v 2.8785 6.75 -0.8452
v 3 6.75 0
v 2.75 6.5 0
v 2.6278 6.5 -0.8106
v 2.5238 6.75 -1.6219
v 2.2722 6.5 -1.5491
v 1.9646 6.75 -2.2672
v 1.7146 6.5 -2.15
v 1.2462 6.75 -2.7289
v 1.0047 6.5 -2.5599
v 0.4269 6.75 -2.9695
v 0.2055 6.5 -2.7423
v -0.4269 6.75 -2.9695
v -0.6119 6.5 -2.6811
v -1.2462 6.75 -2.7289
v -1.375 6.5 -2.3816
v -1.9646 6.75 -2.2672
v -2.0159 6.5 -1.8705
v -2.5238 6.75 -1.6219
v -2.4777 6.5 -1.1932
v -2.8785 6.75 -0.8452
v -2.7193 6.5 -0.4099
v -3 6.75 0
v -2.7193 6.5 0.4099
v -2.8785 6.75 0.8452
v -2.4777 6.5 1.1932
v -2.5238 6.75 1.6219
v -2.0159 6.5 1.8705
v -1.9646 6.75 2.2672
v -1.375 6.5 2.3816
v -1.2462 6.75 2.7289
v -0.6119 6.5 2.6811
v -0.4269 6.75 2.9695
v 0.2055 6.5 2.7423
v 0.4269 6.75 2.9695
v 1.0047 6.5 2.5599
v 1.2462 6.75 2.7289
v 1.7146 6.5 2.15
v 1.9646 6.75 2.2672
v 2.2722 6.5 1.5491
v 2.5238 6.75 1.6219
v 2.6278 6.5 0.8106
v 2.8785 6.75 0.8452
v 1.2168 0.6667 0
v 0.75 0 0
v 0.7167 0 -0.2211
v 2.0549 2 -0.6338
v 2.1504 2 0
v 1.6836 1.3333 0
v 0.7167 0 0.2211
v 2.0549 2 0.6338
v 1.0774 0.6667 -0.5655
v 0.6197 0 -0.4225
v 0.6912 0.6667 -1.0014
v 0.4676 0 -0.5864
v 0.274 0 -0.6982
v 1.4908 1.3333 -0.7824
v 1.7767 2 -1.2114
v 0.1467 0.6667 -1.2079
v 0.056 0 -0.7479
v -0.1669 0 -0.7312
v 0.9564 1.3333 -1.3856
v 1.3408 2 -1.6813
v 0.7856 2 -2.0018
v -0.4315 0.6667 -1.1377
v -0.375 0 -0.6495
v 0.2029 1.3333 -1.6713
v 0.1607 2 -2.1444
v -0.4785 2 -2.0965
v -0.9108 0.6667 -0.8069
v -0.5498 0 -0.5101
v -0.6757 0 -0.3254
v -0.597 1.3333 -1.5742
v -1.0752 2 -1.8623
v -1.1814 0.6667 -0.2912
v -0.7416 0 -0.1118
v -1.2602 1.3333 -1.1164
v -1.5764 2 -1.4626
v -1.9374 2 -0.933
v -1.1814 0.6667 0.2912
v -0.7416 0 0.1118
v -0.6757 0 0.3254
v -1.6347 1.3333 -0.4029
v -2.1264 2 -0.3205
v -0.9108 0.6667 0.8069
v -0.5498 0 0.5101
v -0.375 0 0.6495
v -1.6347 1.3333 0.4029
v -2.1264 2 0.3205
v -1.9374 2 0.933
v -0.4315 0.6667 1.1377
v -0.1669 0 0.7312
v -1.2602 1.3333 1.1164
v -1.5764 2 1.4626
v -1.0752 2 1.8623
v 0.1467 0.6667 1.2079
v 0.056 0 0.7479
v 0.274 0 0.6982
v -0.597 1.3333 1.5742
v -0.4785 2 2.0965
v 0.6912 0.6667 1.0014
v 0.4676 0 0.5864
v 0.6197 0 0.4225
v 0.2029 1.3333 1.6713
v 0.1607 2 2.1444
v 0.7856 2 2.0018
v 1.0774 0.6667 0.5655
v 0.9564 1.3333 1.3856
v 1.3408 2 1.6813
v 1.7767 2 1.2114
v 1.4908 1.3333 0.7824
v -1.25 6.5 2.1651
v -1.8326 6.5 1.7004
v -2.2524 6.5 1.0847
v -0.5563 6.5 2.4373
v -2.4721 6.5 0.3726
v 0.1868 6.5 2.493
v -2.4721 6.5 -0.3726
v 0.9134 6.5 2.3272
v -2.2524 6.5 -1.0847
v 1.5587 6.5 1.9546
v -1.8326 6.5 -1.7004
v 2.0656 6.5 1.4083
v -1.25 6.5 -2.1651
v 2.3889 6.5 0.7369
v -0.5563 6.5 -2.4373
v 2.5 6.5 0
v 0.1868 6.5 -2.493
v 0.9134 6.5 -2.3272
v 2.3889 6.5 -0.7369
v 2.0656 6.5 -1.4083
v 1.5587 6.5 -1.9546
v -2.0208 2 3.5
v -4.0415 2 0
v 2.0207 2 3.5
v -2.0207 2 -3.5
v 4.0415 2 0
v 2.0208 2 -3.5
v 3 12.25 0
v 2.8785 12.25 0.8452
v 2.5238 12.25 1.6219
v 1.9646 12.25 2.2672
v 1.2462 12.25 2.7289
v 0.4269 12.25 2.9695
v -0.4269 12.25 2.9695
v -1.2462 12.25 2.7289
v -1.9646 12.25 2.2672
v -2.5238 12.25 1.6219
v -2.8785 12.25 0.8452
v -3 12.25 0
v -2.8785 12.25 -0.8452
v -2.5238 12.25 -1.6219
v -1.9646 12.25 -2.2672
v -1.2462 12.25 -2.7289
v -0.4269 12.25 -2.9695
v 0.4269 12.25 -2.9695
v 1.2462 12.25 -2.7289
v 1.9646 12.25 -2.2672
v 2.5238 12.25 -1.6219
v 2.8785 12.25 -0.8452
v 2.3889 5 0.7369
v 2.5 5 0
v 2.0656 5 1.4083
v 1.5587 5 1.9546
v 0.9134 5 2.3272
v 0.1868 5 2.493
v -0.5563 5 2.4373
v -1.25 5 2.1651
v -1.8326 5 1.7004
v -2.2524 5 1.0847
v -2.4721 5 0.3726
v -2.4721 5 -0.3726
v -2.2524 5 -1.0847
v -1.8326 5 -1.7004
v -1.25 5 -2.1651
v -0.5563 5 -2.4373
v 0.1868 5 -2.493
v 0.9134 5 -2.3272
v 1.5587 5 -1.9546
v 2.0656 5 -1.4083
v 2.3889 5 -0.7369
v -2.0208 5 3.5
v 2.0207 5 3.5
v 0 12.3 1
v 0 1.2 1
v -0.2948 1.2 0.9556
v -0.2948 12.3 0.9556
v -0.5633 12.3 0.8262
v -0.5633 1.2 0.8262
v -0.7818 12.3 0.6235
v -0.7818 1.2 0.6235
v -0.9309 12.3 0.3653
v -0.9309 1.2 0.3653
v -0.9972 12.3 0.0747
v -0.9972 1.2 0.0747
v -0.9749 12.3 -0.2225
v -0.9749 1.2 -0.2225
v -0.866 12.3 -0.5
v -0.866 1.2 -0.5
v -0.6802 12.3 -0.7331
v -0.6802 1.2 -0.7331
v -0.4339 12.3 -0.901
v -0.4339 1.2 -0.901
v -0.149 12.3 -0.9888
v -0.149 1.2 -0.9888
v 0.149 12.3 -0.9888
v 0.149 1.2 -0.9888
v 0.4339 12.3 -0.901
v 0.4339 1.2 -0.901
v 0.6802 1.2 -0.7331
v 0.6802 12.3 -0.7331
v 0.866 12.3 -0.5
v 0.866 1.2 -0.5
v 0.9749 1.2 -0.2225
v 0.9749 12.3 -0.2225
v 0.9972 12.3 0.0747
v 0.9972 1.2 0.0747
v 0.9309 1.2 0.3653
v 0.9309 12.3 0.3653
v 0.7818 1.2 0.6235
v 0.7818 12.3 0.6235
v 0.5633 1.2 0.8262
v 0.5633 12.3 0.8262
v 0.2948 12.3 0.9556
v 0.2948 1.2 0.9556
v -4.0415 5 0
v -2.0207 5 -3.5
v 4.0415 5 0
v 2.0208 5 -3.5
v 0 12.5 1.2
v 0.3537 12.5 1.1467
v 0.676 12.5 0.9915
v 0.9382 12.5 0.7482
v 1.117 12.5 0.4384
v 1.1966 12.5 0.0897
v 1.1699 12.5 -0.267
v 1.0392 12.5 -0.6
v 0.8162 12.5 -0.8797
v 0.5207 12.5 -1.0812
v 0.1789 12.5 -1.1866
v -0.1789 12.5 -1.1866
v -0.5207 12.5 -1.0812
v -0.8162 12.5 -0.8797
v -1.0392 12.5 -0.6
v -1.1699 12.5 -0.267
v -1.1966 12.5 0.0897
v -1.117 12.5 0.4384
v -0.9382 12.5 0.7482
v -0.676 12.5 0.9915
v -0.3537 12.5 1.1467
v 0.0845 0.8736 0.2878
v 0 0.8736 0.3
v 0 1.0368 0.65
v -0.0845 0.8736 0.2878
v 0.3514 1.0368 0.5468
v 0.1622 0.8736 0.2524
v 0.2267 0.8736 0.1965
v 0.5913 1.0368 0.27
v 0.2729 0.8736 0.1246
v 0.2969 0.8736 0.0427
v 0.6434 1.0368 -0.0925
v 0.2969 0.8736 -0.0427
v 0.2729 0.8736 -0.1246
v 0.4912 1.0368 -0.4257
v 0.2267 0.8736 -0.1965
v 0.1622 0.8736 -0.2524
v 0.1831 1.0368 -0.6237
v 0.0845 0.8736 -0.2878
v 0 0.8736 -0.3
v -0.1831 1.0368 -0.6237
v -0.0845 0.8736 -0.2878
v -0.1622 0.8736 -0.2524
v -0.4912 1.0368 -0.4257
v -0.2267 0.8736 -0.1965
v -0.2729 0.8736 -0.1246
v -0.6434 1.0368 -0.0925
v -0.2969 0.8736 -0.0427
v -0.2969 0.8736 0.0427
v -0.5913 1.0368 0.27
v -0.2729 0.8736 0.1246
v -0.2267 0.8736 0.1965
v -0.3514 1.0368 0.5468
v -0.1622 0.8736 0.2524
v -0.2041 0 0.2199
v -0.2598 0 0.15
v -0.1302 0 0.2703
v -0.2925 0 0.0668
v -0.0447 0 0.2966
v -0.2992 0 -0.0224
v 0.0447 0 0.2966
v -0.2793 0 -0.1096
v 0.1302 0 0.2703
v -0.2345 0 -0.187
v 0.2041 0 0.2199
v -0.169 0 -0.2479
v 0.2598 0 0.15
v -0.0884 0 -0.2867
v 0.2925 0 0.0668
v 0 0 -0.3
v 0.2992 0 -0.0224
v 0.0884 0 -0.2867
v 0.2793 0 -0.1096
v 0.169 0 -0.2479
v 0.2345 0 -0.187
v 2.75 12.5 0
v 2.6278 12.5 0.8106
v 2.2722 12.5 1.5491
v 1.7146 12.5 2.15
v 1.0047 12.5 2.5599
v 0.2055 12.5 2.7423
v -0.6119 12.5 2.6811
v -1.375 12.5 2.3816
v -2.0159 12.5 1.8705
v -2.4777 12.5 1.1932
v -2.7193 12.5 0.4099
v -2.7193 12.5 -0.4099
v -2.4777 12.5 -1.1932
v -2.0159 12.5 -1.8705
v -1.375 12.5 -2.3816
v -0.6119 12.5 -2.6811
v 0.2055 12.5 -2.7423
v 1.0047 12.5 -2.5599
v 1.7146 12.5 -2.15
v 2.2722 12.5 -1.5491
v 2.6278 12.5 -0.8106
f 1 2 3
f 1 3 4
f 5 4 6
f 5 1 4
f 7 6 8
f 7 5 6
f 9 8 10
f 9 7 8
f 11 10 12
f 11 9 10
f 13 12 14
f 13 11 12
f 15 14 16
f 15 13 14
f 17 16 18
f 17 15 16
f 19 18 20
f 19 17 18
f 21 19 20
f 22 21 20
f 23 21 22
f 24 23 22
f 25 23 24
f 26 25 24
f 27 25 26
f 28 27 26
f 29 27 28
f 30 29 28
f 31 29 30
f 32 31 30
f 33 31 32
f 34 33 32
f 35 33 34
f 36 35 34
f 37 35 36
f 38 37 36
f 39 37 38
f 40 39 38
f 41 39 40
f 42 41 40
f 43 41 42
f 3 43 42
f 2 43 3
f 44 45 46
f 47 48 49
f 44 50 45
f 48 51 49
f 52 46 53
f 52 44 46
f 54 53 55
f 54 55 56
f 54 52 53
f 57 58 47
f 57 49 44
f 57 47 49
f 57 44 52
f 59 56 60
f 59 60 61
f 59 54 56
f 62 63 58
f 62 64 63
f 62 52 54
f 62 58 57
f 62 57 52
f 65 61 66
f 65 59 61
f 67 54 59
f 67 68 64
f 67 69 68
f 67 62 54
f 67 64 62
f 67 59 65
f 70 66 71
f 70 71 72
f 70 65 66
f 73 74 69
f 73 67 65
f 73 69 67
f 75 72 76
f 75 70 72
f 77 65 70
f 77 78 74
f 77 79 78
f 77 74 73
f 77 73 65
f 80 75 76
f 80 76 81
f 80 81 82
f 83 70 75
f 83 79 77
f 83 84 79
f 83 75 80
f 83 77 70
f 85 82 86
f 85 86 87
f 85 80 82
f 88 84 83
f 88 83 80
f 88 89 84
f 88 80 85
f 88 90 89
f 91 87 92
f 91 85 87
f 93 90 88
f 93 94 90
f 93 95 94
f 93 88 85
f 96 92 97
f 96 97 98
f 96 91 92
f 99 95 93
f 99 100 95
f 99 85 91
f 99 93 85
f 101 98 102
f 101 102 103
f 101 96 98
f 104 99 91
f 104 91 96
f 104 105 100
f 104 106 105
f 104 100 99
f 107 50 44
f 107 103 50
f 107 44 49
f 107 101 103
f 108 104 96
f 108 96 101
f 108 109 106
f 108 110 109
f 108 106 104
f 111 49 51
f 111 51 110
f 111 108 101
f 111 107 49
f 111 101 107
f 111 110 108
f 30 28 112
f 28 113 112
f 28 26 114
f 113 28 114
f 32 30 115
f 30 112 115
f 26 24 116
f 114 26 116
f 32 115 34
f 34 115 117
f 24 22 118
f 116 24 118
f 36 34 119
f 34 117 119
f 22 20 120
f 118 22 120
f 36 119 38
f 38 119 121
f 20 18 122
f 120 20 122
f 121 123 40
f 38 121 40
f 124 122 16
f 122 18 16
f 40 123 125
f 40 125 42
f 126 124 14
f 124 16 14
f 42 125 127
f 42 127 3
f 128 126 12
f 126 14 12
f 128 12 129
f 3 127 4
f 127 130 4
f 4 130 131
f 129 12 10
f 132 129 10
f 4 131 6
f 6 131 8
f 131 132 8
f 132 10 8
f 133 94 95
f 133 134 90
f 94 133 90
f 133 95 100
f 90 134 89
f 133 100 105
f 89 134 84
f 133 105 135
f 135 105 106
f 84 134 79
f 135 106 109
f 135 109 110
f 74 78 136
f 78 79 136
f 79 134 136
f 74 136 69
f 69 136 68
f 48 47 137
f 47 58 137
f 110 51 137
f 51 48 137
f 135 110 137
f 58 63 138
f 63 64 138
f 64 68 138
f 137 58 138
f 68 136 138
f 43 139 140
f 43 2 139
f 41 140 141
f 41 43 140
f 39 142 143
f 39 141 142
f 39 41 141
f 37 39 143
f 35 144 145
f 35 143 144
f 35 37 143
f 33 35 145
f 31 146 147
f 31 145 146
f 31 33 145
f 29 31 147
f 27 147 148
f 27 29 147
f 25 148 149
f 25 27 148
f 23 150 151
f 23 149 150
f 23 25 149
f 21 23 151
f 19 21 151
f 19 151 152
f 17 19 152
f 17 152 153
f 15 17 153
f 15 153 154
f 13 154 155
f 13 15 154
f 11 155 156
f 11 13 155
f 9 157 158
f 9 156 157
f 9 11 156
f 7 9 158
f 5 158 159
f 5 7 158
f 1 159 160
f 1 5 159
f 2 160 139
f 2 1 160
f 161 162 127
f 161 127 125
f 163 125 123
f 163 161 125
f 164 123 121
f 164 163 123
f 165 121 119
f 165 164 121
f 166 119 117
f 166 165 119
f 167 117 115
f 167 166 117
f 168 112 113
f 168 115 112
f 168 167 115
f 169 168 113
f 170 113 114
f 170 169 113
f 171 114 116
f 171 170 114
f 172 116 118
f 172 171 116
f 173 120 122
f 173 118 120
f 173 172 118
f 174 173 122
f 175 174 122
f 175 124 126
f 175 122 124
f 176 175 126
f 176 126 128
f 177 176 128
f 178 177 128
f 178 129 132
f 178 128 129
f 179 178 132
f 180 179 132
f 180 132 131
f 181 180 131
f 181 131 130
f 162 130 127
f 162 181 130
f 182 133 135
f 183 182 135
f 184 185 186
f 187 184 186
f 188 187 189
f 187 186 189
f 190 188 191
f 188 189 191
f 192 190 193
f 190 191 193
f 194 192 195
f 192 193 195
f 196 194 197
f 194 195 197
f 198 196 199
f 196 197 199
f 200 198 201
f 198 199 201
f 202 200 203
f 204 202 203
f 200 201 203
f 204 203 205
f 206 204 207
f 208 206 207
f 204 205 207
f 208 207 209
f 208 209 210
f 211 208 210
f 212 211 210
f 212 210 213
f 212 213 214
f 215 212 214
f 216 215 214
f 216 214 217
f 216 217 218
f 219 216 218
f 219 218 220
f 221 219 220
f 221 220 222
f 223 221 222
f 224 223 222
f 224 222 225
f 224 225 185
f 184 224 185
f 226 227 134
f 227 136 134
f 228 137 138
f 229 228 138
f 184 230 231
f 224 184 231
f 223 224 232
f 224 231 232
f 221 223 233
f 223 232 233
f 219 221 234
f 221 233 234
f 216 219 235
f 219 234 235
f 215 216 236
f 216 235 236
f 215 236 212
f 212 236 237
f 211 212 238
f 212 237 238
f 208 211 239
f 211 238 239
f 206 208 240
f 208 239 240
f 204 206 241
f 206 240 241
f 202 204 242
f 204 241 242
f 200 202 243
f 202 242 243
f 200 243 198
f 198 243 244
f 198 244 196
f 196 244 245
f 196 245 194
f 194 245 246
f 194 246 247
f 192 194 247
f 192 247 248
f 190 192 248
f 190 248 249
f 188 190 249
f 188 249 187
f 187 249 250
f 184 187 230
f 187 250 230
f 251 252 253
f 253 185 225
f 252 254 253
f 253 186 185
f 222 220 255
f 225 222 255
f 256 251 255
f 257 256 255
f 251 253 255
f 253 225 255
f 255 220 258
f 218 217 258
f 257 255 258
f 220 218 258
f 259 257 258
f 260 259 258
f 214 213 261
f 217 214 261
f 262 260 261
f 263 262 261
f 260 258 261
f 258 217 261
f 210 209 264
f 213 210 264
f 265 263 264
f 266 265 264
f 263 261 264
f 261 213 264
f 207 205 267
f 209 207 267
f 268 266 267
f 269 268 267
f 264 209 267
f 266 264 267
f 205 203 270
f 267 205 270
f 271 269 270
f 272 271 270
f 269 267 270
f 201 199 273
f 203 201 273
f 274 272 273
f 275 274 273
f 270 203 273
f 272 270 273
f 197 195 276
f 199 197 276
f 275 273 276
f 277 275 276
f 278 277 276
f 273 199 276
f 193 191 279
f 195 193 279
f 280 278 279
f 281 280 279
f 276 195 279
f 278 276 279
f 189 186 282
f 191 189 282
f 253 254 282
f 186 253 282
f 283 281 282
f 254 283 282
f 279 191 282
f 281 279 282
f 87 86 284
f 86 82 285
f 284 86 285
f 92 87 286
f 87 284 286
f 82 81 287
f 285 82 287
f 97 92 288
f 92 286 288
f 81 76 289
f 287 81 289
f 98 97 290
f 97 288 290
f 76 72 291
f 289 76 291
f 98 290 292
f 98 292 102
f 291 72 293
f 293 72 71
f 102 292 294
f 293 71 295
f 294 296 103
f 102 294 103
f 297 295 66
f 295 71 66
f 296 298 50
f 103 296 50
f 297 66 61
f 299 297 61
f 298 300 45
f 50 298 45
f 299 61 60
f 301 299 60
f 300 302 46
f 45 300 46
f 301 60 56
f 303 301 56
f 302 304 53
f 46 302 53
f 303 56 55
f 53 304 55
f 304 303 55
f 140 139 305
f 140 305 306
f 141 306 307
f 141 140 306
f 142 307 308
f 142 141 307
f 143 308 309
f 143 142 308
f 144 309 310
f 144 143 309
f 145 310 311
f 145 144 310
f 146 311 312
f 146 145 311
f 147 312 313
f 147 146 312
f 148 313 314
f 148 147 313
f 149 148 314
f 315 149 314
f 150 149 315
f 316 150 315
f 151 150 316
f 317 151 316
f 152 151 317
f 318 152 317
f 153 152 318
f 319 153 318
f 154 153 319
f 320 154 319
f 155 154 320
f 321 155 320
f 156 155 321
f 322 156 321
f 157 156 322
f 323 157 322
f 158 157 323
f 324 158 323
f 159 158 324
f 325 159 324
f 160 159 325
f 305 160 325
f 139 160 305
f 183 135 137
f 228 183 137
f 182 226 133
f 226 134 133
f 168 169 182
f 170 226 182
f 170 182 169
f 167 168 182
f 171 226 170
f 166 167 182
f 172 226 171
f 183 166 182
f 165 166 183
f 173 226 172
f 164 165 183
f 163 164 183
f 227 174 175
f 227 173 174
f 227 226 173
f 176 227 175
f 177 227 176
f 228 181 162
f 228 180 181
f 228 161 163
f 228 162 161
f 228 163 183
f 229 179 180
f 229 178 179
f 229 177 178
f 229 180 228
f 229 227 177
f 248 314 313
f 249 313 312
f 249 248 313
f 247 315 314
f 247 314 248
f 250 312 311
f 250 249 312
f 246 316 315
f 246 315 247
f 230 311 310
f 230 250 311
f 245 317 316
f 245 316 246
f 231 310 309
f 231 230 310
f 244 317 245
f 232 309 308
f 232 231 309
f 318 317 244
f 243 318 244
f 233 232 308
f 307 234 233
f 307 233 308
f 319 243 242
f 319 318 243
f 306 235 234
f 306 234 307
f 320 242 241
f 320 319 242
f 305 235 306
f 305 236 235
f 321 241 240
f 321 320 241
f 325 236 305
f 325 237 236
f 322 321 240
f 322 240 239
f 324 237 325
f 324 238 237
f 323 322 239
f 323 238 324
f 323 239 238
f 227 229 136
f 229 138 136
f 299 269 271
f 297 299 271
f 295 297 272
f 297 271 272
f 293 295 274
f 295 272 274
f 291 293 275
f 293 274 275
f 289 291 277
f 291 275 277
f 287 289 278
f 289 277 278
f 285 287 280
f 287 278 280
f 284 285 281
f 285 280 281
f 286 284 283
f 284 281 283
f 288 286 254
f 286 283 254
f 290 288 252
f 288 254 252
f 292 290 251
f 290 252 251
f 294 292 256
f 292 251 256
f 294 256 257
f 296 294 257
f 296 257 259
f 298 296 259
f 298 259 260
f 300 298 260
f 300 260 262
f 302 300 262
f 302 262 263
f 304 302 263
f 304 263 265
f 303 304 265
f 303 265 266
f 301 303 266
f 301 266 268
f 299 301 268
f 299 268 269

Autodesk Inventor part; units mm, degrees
ref_plane "YZ Plane" through (0, 0, 0) normal (1, 0, 0) x (0, 1, 0)
ref_plane "XZ Plane" through (0, 0, 0) normal (0, 1, 0) x (-1, 0, 0)
ref_plane "XY Plane" through (0, 0, 0) normal (0, 0, 1) x (1, 0, 0)
sketch "Эскиз1" plane through (0, 0, 0) normal (0, 0, 1) x (1, 0, 0)
  line L0 (0, 0) -> (0, 15)
  line L1 (0, 12.5) -> (3, 12.5)
  line L2 (2.1504, 2) -> (4.0415, 2)
  line L3 (2.5, 5) -> (4.0415, 5)
  line L4 (2.5, 6.5) -> (3, 6.5)
  line L5 (0, 0) -> (0.75, 0)
  line L6 (2.5, 6.5) -> (2.5, 5)
  line L7 (3, 12.5) -> (3, 6.5)
  line L8 (0.75, 0) -> (2.1504, 2)
  line L9 (4.0415, 5) -> (4.0415, 2)
  line L10 (0, 12.5) -> (0, 0)
  dimension "d0" = 15
  dimension "d1" = 12.5
  dimension "d2" = 10.5
  dimension "d3" = 7.5
  dimension "d4" = 6
  dimension "d6" = 5
  dimension "d7" = 6
  dimension "d8" = 125
  dimension "d11" = 8.083
  dimension "d44" = 1.5
revolve "Вращение1" add sketch "Эскиз1" angle 360 about axis through (0, 0, 0) along (0, 1, 0)
chamfer "Фаска1" distance 0.25 angle 45 2 edges at (-3, 12.5, 0) (-3, 6.5, 0)
thread "Резьба1" size "M6x1" class "6g" standard "ANSI Metric M Profile" full length
sketch "Эскиз2" plane through (0, 12.5, 0) normal (0, 1, 0) x (1, 0, 0)
  point P0 (0, 0)
  point P1 (0, 0)
sketch "Эскиз3" plane through (0, 0, 0) normal (0, -1, 0) x (1, 0, 0)
  point P0 (0, 0)
  point P1 (0, 0)
hole "Отверстие2" at (0, 12.5, 0) direction (0, -1, 0) diameter 2 depth 11.3 tip angle 130
chamfer "Фаска2" distance 0.2 angle 45 1 edges at (0, 12.5, -1)
hole "Отверстие3" at (0, 0, 0) direction (0, 1, 0) diameter 0.6 depth 1.2
sketch "Эскиз4" plane through (0, 2, 0) normal (0, -1, 0) x (1, 0, 0)
  circle A0 centre (0, 0) radius 0.3 projected
  circle A1 centre (0, 0) radius 4.0415 projected
  line L0 (4.0415, 0) -> (2.0208, -3.5)
  line L1 (2.0208, -3.5) -> (-2.0207, -3.5)
  line L2 (-2.0207, -3.5) -> (-4.0415, 0)
  line L3 (-4.0415, 0) -> (-2.0208, 3.5)
  line L4 (-2.0208, 3.5) -> (2.0207, 3.5)
  line L5 (2.0207, 3.5) -> (4.0415, 0)
extrude "Выдавливание1" cut sketch "Эскиз4" against normal blind 3 contours L5 A1 | A1 L0 | L4 A1 | A1 L1 | L3 A1 | A1 L2
properties part number "nozzle-0,5"
